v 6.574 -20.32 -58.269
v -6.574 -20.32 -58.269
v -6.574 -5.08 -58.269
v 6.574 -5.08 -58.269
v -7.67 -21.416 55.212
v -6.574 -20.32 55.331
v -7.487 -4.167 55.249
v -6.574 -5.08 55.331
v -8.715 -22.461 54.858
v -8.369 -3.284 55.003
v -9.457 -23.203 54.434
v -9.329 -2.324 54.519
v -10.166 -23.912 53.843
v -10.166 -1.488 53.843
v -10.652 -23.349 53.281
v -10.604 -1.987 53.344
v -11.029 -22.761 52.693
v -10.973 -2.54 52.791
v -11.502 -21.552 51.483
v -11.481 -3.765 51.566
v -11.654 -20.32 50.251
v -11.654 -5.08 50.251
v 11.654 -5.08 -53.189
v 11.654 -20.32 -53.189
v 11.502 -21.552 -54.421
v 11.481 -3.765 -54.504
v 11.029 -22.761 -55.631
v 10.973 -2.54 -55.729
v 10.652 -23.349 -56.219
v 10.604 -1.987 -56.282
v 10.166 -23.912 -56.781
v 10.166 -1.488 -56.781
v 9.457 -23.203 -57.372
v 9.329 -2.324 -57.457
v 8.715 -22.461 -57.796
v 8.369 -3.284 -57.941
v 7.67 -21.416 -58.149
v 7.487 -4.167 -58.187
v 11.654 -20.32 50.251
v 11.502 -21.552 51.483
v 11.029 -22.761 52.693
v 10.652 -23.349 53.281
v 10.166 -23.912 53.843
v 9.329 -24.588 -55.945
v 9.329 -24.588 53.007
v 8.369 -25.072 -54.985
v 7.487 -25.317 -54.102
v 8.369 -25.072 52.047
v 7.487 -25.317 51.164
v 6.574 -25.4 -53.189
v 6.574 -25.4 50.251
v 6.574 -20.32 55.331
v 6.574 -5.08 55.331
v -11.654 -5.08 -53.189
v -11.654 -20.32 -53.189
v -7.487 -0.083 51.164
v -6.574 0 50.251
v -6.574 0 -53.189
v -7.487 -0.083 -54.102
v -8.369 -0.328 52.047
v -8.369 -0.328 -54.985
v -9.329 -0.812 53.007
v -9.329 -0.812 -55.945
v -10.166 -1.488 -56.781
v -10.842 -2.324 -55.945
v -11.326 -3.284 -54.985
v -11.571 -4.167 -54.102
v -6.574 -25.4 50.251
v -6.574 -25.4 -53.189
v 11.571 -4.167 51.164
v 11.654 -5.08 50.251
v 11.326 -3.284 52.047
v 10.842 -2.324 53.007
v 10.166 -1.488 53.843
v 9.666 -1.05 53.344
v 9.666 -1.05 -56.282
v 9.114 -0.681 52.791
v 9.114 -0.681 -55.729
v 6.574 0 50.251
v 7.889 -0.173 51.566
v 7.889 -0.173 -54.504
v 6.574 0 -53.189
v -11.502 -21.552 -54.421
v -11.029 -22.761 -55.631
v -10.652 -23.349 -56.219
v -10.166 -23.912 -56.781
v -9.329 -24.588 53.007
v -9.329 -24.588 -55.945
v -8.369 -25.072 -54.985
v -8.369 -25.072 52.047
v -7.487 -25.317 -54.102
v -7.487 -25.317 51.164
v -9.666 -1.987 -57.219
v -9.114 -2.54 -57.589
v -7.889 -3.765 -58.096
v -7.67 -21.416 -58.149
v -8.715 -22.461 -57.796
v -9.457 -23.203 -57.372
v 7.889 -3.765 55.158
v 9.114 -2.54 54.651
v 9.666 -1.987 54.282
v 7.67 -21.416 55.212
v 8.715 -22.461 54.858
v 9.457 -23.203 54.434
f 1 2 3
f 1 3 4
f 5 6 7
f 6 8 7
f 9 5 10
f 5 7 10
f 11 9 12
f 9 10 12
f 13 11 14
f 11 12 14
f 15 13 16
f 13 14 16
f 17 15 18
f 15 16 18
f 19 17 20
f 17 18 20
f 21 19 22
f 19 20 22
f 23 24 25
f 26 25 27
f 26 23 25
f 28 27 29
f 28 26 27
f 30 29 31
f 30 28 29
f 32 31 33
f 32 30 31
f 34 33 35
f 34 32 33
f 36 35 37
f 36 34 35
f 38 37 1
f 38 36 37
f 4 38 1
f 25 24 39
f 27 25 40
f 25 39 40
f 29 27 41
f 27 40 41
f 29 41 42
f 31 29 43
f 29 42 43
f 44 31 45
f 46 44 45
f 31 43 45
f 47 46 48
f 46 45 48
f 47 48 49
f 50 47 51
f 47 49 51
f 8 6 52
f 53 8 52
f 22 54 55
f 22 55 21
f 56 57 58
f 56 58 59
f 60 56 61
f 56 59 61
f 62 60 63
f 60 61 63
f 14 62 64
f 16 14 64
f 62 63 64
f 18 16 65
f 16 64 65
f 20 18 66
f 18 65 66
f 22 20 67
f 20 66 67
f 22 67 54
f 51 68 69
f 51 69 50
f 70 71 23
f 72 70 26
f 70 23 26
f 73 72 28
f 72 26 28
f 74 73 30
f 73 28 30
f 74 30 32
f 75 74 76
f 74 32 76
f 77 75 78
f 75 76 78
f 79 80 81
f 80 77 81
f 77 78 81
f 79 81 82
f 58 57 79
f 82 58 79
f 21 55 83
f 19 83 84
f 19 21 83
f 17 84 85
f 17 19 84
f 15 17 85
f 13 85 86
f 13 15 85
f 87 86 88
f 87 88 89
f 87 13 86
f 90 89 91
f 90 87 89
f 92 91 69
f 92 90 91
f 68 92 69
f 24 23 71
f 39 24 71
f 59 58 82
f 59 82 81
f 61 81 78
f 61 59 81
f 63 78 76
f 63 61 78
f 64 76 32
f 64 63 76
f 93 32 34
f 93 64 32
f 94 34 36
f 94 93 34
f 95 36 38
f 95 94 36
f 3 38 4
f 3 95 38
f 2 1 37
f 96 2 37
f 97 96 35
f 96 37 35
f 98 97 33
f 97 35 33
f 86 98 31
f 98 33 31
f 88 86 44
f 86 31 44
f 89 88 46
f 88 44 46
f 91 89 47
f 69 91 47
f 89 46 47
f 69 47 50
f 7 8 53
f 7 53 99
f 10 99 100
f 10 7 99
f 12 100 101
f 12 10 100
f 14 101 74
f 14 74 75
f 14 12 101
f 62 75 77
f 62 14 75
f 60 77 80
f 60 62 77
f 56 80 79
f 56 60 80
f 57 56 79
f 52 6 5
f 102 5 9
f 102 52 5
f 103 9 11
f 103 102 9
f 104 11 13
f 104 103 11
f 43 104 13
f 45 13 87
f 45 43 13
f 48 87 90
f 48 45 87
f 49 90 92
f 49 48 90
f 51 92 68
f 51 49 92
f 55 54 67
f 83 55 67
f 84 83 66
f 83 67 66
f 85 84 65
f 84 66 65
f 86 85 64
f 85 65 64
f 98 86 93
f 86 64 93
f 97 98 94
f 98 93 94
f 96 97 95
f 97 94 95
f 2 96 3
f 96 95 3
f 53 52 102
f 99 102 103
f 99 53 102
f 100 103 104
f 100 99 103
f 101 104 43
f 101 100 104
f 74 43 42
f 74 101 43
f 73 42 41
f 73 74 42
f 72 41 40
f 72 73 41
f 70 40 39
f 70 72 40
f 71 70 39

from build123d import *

# Parameters (mm, degrees)
F0_W        = 23.3076866716
F0_H        = 113.6004934087
F1_DEPTH    = 25.4
F2_R        = 5.08
F3_T1_DEPTH = 45.72
F3_T3_DEPTH = 139.0004934087
F4_T1_DEPTH = 45.72
F4_T3_DEPTH = 139.0004934087
F5_T1_DEPTH = 38.5476866716


# Not quite as in the source:
# - a fillet or chamfer that OpenCascade refuses, or shapes differently, is made with other operations: its cross-section is extruded or revolved along the edge and cut away or added


with BuildPart() as f1:
    # F0 (on Front) → F1 (new body)
    with BuildSketch(Plane.XZ):
        with Locations((0, -1.4689718373)):
            Rectangle(F0_W, F0_H)
    extrude(amount=F1_DEPTH)

    # F2
    f2_edges = [f1.edges().sort_by_distance(p)[0] for p in [
        (0, -25.4, 55.331275),
        (-11.653843, -25.4, -1.468972),
        (0, -25.4, -58.269219),
        (11.653843, -25.4, -1.468972),
    ]]
    fillet(f2_edges, radius=F2_R)

    # F3: fillet of radius 5.08 on 4 edges, made by hand

    # F3_s2 → F3_t1 (cut)
    with BuildSketch(Plane.XZ.offset(-12.7)):
        with BuildLine():
            ThreePointArc((11.6538433358, -53.1892185417), (10.1659457842, -56.7813209901), (6.5738433358, -58.2692185417))
            Line((6.5738433358, -58.2692185417), (11.6538433358, -58.2692185417))
            Line((11.6538433358, -58.2692185417), (11.6538433358, -53.1892185417))
        make_face()
        with BuildLine():
            ThreePointArc((6.5738433358, 55.3312748671), (10.1659457842, 53.8433773155), (11.6538433358, 50.2512748671))
            Line((11.6538433358, 50.2512748671), (11.6538433358, 55.3312748671))
            Line((11.6538433358, 55.3312748671), (6.5738433358, 55.3312748671))
        make_face()
    extrude(amount=F3_T1_DEPTH, mode=Mode.SUBTRACT)

    # F3_s4 → F3_t3 (cut)
    with BuildSketch(Plane.XY.offset(-70.9692185417)):
        with BuildLine():
            ThreePointArc((11.6538433358, -5.08), (10.1659457842, -1.4878975516), (6.5738433358, 0))
            Line((6.5738433358, 0), (11.6538433358, 0))
            Line((11.6538433358, 0), (11.6538433358, -5.08))
        make_face()
    extrude(amount=F3_T3_DEPTH, mode=Mode.SUBTRACT)

    # F4: fillet of radius 5.08 on 4 edges, made by hand

    # F4_s2 → F4_t1 (cut)
    with BuildSketch(Plane.XZ.offset(-12.7)):
        with BuildLine():
            ThreePointArc((-6.5738433358, 55.3312748671), (-10.1659457842, 53.8433773155), (-11.6538433358, 50.2512748671))
            Line((-11.6538433358, 50.2512748671), (-11.6538433358, 55.3312748671))
            Line((-11.6538433358, 55.3312748671), (-6.5738433358, 55.3312748671))
        make_face()
        with BuildLine():
            ThreePointArc((-11.6538433358, -53.1892185417), (-10.1659457842, -56.7813209901), (-6.5738433358, -58.2692185417))
            Line((-6.5738433358, -58.2692185417), (-11.6538433358, -58.2692185417))
            Line((-11.6538433358, -58.2692185417), (-11.6538433358, -53.1892185417))
        make_face()
    extrude(amount=F4_T1_DEPTH, mode=Mode.SUBTRACT)

    # F4_s4 → F4_t3 (cut)
    with BuildSketch(Plane.XY.offset(-70.9692185417)):
        with BuildLine():
            ThreePointArc((-6.5738433358, 0), (-10.1659457842, -1.4878975516), (-11.6538433358, -5.08))
            Line((-11.6538433358, -5.08), (-11.6538433358, 0))
            Line((-11.6538433358, 0), (-6.5738433358, 0))
        make_face()
    extrude(amount=F4_T3_DEPTH, mode=Mode.SUBTRACT)

    # F5: fillet of radius 5.08 on 4 edges, made by hand

    # F5_s2 → F5_t1 (cut)
    with BuildSketch(Plane.YZ.offset(-19.2738433358)):
        with BuildLine():
            ThreePointArc((-5.08, 55.3312748671), (-1.4878975516, 53.8433773155), (0, 50.2512748671))
            Line((0, 50.2512748671), (0, 55.3312748671))
            Line((0, 55.3312748671), (-5.08, 55.3312748671))
        make_face()
        with BuildLine():
            ThreePointArc((0, -53.1892185417), (-1.4878975516, -56.7813209901), (-5.08, -58.2692185417))
            Line((-5.08, -58.2692185417), (0, -58.2692185417))
            Line((0, -58.2692185417), (0, -53.1892185417))
        make_face()
    extrude(amount=F5_T1_DEPTH, mode=Mode.SUBTRACT)


solid = f1.part
